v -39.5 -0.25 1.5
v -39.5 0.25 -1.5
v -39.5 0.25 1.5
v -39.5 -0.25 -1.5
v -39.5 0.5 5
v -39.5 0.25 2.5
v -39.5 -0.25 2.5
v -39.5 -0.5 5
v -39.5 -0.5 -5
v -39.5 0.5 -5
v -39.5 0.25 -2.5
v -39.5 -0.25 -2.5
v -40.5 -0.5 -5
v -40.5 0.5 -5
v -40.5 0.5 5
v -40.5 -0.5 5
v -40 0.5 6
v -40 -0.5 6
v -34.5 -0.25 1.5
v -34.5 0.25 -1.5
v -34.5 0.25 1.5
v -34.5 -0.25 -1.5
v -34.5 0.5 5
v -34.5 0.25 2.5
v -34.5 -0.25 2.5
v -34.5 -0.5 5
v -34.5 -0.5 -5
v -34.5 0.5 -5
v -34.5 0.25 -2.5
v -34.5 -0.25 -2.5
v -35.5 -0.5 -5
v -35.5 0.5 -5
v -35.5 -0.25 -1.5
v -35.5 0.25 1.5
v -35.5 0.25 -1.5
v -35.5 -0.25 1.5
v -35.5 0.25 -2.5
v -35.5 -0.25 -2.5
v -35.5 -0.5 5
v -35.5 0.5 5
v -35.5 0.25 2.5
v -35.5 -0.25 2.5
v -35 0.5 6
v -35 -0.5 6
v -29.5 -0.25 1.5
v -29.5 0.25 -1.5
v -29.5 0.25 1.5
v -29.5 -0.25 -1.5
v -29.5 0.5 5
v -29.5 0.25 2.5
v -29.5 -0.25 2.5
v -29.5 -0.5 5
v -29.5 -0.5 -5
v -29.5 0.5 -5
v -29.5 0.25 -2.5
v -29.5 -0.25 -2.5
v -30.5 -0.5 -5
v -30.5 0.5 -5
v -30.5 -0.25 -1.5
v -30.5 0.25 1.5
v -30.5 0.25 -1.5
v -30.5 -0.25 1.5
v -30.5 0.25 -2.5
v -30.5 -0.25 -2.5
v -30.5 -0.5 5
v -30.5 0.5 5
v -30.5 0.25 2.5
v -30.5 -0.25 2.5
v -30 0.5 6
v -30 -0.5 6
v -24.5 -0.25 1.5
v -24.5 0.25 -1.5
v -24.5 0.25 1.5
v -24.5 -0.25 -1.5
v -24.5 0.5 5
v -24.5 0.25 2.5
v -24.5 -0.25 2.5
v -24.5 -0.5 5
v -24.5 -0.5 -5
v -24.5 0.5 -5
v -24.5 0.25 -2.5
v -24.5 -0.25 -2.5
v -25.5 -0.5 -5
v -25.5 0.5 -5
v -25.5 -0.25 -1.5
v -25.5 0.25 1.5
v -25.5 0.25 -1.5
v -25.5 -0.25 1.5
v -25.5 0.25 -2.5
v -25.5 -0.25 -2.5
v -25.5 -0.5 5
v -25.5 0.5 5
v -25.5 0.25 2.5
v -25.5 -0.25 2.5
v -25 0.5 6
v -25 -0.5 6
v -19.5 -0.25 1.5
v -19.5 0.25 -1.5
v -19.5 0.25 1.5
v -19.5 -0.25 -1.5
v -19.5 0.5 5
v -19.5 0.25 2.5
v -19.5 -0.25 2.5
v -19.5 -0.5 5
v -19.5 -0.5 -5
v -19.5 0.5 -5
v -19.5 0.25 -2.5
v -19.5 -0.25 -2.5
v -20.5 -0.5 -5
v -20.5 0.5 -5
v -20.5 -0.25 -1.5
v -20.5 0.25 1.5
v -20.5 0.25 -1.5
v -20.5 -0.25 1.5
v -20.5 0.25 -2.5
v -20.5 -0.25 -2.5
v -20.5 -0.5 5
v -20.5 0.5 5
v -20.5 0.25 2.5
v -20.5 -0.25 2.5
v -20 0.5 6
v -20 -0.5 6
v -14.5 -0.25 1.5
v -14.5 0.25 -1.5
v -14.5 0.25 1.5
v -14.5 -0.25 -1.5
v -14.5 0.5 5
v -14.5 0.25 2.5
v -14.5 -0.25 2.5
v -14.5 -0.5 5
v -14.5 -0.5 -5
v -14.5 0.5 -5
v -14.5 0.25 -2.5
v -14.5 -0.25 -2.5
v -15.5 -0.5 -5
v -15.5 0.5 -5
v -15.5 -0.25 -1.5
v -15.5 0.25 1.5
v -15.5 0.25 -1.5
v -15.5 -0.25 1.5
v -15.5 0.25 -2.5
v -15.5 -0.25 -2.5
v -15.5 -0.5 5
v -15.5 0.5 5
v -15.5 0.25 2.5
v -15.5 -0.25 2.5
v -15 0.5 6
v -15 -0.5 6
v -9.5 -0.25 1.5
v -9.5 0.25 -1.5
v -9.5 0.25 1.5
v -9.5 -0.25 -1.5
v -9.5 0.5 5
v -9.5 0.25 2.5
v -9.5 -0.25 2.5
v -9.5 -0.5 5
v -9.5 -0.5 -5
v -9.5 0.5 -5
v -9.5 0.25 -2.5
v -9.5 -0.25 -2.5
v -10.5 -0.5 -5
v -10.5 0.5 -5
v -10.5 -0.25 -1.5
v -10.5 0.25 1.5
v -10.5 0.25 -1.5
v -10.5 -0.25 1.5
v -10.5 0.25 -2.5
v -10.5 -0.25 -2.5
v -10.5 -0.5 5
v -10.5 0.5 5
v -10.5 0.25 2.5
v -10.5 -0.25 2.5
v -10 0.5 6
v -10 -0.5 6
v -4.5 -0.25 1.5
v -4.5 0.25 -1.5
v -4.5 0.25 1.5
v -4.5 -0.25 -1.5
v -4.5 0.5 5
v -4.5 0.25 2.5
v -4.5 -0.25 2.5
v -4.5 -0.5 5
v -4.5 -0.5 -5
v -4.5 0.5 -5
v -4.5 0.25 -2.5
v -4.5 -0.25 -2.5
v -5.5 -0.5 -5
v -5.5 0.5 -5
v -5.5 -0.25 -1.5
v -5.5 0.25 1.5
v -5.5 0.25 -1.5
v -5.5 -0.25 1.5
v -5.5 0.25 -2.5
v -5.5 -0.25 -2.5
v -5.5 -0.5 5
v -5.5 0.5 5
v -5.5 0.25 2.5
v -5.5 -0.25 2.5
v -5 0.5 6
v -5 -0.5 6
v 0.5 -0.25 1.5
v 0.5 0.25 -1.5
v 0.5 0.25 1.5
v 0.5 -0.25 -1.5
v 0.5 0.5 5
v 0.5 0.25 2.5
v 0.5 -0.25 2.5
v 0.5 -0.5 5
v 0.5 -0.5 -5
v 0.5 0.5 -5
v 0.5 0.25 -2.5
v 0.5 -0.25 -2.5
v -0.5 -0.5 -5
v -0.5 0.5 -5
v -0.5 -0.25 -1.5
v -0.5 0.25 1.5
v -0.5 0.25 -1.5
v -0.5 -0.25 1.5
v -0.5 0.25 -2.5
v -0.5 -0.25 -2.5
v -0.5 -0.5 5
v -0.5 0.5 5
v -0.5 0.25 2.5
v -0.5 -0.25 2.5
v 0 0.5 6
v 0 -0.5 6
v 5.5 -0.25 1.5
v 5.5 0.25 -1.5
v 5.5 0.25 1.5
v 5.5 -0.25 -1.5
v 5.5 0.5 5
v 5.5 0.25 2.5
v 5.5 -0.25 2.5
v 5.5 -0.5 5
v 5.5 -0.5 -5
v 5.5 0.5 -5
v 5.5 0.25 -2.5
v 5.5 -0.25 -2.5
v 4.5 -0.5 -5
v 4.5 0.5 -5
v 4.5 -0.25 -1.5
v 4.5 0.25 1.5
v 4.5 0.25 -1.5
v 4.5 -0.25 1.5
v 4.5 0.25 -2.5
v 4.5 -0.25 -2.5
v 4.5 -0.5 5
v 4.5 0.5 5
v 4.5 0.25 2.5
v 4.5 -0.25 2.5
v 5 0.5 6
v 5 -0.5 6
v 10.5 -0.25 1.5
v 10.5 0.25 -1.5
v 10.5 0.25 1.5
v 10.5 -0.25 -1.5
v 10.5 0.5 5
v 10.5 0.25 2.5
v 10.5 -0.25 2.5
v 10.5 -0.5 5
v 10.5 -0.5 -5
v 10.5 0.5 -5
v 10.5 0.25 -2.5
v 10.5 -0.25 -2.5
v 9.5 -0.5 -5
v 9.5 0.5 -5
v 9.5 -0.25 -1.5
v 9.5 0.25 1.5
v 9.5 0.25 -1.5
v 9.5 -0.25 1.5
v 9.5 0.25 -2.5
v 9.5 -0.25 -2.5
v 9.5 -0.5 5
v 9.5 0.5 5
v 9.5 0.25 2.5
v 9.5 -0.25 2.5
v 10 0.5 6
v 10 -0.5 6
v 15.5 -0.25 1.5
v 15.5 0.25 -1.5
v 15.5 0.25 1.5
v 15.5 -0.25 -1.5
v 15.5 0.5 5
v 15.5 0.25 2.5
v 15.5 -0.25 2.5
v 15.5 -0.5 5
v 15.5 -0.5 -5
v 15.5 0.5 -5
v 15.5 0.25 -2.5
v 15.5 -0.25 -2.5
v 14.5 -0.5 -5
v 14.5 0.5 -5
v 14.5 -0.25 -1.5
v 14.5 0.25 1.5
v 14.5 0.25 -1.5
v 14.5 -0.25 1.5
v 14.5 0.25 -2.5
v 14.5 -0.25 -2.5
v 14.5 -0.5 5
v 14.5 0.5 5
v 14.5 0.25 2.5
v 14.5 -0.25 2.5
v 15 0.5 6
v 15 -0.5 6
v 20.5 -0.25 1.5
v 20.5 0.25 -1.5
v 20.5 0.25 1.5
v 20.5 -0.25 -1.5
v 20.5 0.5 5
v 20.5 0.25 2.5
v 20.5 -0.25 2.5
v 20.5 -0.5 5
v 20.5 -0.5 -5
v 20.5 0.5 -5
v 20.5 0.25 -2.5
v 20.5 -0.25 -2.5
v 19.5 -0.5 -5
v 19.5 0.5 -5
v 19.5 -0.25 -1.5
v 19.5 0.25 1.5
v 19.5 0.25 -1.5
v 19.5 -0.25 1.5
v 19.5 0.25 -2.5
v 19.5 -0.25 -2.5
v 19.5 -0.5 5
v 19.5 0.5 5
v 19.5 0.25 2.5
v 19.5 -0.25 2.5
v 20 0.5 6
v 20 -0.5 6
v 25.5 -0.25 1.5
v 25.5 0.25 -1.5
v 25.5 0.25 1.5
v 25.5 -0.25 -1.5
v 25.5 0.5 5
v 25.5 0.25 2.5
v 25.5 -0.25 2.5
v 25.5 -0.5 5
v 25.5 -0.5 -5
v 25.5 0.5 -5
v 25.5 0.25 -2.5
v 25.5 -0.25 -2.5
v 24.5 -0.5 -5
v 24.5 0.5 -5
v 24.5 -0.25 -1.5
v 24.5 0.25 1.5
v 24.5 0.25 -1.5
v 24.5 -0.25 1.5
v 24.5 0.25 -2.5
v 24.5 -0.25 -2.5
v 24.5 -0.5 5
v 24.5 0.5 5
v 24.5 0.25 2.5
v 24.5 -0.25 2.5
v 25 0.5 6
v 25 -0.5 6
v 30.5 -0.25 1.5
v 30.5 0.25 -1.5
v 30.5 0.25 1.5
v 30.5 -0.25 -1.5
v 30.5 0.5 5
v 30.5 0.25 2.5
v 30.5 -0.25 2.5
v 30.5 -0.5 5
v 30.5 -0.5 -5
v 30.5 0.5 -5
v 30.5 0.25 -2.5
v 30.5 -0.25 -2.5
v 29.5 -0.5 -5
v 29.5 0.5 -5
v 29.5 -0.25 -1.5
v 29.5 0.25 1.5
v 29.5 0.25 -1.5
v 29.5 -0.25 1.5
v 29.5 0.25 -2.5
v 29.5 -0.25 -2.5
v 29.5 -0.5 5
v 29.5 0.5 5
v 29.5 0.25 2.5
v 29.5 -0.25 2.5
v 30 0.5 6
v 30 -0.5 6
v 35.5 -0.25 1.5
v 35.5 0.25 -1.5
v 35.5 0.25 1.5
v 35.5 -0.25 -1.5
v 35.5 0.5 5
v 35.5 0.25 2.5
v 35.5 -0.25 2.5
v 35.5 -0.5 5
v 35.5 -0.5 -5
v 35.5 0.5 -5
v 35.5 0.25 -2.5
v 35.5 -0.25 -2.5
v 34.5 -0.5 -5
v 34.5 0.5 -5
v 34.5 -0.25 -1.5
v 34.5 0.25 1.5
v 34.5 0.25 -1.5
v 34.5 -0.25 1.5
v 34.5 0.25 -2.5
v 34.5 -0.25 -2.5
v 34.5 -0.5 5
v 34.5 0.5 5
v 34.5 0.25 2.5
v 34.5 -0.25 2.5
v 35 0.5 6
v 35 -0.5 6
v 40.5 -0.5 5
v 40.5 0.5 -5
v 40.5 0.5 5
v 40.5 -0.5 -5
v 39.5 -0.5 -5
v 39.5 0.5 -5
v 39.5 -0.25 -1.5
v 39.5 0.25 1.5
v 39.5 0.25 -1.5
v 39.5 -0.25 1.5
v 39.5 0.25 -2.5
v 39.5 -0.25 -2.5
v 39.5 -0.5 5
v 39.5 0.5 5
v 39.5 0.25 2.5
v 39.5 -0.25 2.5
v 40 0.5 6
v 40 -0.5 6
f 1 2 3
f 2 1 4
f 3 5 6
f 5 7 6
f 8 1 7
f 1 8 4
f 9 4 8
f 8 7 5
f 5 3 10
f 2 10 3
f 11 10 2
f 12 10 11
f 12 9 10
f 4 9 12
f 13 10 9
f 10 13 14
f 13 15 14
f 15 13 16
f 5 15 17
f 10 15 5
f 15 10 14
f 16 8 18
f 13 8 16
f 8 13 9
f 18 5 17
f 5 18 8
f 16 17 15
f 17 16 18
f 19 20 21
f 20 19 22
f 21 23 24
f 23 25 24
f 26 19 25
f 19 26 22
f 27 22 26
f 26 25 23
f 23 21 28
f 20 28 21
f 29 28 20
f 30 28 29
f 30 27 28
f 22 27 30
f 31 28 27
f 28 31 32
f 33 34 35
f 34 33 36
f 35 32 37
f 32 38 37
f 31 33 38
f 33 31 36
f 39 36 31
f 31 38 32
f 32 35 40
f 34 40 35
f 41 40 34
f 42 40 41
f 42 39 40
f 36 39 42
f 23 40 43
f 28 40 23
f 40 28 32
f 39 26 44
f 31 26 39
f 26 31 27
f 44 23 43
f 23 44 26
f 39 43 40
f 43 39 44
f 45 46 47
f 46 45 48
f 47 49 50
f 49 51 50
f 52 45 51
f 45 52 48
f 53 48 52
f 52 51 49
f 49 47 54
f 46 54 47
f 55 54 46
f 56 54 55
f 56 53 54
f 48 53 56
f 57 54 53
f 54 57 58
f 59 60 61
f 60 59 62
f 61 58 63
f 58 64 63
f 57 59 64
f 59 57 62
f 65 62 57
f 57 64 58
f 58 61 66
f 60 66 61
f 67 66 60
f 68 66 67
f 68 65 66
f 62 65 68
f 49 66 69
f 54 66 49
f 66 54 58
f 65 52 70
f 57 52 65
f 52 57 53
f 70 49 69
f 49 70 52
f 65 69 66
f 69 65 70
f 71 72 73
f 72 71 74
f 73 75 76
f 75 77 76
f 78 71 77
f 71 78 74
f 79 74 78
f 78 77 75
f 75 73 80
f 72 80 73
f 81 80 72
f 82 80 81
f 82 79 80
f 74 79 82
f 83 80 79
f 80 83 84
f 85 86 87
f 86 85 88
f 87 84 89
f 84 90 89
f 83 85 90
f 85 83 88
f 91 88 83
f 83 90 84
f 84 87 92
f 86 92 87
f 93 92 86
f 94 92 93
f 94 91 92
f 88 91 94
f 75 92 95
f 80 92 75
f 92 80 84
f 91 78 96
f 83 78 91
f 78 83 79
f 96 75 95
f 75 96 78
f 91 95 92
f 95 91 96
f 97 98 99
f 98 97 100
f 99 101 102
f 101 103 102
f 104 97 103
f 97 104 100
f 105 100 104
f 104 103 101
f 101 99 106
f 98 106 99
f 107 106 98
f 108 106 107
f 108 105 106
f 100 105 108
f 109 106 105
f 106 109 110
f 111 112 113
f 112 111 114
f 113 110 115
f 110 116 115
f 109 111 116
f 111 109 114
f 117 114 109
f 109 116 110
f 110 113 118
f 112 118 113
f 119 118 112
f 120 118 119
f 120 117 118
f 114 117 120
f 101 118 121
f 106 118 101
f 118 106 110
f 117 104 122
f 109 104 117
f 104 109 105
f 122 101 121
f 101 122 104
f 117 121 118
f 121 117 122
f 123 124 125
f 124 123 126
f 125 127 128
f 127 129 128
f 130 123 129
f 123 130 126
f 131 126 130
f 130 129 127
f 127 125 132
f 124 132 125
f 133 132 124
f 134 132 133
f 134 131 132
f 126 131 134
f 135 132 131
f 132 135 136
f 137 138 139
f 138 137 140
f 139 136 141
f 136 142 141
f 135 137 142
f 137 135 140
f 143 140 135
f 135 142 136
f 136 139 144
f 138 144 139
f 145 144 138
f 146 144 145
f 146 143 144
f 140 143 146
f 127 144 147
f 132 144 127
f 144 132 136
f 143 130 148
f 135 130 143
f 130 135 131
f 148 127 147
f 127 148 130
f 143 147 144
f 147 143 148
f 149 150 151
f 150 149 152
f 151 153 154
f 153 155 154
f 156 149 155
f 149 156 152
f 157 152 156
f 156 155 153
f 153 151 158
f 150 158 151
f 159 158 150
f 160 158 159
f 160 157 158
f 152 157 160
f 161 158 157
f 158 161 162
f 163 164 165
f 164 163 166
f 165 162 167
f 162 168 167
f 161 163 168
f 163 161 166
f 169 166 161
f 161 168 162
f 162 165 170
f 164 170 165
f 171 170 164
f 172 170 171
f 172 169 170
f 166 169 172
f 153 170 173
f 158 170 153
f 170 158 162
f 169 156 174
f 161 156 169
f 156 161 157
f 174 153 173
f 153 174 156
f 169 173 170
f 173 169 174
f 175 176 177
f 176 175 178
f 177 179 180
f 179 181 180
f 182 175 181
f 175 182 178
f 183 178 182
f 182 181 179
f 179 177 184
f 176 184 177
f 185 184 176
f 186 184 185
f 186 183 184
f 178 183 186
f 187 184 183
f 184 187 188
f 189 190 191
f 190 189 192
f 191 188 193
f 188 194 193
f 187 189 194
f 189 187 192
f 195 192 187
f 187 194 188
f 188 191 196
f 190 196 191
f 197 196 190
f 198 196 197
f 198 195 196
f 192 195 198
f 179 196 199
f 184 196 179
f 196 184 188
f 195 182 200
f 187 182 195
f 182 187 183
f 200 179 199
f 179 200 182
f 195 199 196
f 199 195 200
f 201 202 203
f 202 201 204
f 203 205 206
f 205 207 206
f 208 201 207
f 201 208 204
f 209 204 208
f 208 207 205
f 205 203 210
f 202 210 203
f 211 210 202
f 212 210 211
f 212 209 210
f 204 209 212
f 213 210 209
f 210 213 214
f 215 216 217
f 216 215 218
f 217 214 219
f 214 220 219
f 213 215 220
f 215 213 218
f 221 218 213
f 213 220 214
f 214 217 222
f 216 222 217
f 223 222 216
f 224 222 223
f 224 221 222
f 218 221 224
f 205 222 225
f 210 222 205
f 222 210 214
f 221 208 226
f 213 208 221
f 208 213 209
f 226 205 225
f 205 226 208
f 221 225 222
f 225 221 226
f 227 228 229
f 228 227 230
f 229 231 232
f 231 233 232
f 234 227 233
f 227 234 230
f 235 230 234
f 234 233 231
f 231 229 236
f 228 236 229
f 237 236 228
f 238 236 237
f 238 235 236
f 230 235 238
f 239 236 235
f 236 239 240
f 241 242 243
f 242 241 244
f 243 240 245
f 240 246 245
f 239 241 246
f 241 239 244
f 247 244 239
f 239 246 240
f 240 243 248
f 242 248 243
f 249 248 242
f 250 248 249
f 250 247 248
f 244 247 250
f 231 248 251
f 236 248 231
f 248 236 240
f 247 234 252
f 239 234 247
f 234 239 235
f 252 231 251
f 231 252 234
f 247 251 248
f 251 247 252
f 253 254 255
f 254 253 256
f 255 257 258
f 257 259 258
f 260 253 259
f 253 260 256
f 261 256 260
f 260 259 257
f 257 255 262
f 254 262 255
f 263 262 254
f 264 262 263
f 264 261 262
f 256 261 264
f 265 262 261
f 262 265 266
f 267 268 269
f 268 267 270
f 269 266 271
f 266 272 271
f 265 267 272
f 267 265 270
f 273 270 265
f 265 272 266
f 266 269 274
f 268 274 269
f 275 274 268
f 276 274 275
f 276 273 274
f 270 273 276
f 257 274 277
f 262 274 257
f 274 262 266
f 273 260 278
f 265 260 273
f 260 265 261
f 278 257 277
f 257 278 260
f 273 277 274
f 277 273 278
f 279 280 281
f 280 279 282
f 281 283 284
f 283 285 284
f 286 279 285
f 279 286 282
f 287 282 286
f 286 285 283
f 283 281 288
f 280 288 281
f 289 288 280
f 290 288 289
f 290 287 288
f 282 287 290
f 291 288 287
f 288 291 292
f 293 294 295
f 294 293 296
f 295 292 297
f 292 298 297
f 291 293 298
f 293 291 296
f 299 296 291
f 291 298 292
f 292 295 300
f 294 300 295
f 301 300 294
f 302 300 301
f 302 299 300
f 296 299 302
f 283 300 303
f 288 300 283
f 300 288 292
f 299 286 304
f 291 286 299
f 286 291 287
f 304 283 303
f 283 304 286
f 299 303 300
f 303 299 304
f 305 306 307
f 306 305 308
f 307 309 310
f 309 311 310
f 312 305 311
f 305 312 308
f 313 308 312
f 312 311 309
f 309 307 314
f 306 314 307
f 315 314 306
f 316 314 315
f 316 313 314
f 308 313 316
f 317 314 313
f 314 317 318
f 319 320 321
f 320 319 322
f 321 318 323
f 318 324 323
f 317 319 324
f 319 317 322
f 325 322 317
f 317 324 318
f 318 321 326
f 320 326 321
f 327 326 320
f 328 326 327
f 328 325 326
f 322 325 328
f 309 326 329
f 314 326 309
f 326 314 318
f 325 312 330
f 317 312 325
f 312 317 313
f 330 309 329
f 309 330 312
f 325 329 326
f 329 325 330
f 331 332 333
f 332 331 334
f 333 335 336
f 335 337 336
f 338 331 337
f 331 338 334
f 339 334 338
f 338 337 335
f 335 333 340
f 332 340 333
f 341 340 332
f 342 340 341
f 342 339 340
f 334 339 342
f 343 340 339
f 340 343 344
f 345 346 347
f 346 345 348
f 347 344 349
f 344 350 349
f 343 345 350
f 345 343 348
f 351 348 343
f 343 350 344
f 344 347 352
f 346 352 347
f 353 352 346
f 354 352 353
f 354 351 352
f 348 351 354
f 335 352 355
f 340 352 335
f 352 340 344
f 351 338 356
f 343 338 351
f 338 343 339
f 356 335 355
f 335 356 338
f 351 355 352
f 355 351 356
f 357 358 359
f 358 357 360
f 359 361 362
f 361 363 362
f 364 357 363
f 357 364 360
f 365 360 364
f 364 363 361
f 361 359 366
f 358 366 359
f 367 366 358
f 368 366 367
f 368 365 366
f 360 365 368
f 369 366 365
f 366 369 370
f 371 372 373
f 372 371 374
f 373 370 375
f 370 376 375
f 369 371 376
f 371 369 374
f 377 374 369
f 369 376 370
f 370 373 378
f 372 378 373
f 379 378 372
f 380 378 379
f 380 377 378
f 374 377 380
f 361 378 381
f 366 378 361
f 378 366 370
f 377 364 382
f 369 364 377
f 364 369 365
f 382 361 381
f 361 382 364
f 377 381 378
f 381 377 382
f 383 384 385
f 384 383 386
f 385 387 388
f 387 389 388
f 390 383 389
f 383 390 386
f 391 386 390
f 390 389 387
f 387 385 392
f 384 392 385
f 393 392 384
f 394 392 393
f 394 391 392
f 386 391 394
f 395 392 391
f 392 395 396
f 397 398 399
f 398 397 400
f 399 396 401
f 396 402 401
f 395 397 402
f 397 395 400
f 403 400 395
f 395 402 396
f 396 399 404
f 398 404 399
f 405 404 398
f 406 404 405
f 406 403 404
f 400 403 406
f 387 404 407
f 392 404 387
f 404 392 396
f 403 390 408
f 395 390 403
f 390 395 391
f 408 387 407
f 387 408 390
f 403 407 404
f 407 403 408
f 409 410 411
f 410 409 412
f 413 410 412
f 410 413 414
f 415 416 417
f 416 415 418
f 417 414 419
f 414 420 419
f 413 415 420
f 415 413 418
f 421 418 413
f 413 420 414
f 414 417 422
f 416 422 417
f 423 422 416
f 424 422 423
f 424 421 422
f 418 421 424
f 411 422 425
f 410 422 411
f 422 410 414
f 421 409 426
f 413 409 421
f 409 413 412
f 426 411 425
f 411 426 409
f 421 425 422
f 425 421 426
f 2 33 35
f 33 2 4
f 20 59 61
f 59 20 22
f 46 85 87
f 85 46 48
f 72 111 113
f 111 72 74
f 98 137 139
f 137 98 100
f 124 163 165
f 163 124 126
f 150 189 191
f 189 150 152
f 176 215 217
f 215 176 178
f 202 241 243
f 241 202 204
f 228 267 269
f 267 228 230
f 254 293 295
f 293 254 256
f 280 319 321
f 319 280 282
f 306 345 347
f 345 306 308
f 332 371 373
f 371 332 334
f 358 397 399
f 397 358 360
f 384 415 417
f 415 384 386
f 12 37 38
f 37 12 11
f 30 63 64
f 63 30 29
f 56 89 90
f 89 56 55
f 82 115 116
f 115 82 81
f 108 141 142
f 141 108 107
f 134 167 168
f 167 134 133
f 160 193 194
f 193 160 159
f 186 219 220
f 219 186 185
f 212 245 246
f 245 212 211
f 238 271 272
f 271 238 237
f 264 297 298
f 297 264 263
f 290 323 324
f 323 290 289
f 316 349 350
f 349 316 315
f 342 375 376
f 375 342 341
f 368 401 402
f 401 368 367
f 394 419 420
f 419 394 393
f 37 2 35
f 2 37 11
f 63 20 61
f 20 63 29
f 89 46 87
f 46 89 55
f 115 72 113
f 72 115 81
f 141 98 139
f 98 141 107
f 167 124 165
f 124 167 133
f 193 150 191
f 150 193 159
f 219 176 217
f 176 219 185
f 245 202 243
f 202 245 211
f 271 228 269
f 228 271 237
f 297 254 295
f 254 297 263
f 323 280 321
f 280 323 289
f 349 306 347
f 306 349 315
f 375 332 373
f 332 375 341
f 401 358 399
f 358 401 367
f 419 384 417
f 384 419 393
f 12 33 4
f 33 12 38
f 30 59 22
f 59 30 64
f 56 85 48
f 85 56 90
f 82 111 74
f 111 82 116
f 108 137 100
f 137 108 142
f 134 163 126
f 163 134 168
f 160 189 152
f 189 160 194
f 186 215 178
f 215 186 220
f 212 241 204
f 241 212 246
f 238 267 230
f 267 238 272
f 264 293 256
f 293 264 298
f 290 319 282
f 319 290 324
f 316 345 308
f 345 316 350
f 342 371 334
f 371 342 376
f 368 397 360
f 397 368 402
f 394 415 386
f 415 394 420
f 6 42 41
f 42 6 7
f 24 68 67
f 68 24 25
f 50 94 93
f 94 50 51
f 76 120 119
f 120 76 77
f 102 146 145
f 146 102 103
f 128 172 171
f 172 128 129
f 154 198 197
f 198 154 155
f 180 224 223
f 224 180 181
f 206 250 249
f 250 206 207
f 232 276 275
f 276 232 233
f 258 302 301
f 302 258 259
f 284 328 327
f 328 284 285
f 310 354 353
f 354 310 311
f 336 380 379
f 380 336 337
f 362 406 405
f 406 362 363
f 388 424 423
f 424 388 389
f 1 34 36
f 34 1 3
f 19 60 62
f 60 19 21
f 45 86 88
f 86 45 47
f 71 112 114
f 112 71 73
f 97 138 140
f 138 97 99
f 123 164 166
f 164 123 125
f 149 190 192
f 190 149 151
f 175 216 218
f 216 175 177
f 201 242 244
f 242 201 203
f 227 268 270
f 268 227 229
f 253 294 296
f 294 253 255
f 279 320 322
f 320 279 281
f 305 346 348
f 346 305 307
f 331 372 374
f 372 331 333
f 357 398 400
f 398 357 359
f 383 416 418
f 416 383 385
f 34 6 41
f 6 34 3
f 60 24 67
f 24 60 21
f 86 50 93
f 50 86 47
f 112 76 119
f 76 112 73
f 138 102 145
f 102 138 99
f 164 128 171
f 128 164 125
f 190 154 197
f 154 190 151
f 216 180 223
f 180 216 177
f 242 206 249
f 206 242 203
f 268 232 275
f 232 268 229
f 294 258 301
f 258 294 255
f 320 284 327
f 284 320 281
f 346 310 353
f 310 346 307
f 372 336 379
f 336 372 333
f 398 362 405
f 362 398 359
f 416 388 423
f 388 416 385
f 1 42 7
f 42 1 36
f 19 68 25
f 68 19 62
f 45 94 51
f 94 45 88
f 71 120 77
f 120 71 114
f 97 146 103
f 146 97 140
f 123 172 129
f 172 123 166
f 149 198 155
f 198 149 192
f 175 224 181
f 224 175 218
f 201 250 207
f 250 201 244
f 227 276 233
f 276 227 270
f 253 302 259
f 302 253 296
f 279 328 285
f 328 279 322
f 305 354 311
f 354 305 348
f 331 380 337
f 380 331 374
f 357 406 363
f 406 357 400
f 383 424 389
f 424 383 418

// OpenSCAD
module staccionata(){
cube([1,1,10],center = true);

      
translate([0.5,0.5,5])
rotate([90,-90,0])
linear_extrude(height=1){
polygon([[0,0],[0,1],[1,0.5]], paths=[[0,1,2]]);
}

}

for (i=[-8:8])
   translate([i*5,0,0])
      staccionata();
      
translate([0,0,-2])      
cube([80,0.5,1],center = true);

translate([0,0,2])
cube([80,0.5,1],center = true);
